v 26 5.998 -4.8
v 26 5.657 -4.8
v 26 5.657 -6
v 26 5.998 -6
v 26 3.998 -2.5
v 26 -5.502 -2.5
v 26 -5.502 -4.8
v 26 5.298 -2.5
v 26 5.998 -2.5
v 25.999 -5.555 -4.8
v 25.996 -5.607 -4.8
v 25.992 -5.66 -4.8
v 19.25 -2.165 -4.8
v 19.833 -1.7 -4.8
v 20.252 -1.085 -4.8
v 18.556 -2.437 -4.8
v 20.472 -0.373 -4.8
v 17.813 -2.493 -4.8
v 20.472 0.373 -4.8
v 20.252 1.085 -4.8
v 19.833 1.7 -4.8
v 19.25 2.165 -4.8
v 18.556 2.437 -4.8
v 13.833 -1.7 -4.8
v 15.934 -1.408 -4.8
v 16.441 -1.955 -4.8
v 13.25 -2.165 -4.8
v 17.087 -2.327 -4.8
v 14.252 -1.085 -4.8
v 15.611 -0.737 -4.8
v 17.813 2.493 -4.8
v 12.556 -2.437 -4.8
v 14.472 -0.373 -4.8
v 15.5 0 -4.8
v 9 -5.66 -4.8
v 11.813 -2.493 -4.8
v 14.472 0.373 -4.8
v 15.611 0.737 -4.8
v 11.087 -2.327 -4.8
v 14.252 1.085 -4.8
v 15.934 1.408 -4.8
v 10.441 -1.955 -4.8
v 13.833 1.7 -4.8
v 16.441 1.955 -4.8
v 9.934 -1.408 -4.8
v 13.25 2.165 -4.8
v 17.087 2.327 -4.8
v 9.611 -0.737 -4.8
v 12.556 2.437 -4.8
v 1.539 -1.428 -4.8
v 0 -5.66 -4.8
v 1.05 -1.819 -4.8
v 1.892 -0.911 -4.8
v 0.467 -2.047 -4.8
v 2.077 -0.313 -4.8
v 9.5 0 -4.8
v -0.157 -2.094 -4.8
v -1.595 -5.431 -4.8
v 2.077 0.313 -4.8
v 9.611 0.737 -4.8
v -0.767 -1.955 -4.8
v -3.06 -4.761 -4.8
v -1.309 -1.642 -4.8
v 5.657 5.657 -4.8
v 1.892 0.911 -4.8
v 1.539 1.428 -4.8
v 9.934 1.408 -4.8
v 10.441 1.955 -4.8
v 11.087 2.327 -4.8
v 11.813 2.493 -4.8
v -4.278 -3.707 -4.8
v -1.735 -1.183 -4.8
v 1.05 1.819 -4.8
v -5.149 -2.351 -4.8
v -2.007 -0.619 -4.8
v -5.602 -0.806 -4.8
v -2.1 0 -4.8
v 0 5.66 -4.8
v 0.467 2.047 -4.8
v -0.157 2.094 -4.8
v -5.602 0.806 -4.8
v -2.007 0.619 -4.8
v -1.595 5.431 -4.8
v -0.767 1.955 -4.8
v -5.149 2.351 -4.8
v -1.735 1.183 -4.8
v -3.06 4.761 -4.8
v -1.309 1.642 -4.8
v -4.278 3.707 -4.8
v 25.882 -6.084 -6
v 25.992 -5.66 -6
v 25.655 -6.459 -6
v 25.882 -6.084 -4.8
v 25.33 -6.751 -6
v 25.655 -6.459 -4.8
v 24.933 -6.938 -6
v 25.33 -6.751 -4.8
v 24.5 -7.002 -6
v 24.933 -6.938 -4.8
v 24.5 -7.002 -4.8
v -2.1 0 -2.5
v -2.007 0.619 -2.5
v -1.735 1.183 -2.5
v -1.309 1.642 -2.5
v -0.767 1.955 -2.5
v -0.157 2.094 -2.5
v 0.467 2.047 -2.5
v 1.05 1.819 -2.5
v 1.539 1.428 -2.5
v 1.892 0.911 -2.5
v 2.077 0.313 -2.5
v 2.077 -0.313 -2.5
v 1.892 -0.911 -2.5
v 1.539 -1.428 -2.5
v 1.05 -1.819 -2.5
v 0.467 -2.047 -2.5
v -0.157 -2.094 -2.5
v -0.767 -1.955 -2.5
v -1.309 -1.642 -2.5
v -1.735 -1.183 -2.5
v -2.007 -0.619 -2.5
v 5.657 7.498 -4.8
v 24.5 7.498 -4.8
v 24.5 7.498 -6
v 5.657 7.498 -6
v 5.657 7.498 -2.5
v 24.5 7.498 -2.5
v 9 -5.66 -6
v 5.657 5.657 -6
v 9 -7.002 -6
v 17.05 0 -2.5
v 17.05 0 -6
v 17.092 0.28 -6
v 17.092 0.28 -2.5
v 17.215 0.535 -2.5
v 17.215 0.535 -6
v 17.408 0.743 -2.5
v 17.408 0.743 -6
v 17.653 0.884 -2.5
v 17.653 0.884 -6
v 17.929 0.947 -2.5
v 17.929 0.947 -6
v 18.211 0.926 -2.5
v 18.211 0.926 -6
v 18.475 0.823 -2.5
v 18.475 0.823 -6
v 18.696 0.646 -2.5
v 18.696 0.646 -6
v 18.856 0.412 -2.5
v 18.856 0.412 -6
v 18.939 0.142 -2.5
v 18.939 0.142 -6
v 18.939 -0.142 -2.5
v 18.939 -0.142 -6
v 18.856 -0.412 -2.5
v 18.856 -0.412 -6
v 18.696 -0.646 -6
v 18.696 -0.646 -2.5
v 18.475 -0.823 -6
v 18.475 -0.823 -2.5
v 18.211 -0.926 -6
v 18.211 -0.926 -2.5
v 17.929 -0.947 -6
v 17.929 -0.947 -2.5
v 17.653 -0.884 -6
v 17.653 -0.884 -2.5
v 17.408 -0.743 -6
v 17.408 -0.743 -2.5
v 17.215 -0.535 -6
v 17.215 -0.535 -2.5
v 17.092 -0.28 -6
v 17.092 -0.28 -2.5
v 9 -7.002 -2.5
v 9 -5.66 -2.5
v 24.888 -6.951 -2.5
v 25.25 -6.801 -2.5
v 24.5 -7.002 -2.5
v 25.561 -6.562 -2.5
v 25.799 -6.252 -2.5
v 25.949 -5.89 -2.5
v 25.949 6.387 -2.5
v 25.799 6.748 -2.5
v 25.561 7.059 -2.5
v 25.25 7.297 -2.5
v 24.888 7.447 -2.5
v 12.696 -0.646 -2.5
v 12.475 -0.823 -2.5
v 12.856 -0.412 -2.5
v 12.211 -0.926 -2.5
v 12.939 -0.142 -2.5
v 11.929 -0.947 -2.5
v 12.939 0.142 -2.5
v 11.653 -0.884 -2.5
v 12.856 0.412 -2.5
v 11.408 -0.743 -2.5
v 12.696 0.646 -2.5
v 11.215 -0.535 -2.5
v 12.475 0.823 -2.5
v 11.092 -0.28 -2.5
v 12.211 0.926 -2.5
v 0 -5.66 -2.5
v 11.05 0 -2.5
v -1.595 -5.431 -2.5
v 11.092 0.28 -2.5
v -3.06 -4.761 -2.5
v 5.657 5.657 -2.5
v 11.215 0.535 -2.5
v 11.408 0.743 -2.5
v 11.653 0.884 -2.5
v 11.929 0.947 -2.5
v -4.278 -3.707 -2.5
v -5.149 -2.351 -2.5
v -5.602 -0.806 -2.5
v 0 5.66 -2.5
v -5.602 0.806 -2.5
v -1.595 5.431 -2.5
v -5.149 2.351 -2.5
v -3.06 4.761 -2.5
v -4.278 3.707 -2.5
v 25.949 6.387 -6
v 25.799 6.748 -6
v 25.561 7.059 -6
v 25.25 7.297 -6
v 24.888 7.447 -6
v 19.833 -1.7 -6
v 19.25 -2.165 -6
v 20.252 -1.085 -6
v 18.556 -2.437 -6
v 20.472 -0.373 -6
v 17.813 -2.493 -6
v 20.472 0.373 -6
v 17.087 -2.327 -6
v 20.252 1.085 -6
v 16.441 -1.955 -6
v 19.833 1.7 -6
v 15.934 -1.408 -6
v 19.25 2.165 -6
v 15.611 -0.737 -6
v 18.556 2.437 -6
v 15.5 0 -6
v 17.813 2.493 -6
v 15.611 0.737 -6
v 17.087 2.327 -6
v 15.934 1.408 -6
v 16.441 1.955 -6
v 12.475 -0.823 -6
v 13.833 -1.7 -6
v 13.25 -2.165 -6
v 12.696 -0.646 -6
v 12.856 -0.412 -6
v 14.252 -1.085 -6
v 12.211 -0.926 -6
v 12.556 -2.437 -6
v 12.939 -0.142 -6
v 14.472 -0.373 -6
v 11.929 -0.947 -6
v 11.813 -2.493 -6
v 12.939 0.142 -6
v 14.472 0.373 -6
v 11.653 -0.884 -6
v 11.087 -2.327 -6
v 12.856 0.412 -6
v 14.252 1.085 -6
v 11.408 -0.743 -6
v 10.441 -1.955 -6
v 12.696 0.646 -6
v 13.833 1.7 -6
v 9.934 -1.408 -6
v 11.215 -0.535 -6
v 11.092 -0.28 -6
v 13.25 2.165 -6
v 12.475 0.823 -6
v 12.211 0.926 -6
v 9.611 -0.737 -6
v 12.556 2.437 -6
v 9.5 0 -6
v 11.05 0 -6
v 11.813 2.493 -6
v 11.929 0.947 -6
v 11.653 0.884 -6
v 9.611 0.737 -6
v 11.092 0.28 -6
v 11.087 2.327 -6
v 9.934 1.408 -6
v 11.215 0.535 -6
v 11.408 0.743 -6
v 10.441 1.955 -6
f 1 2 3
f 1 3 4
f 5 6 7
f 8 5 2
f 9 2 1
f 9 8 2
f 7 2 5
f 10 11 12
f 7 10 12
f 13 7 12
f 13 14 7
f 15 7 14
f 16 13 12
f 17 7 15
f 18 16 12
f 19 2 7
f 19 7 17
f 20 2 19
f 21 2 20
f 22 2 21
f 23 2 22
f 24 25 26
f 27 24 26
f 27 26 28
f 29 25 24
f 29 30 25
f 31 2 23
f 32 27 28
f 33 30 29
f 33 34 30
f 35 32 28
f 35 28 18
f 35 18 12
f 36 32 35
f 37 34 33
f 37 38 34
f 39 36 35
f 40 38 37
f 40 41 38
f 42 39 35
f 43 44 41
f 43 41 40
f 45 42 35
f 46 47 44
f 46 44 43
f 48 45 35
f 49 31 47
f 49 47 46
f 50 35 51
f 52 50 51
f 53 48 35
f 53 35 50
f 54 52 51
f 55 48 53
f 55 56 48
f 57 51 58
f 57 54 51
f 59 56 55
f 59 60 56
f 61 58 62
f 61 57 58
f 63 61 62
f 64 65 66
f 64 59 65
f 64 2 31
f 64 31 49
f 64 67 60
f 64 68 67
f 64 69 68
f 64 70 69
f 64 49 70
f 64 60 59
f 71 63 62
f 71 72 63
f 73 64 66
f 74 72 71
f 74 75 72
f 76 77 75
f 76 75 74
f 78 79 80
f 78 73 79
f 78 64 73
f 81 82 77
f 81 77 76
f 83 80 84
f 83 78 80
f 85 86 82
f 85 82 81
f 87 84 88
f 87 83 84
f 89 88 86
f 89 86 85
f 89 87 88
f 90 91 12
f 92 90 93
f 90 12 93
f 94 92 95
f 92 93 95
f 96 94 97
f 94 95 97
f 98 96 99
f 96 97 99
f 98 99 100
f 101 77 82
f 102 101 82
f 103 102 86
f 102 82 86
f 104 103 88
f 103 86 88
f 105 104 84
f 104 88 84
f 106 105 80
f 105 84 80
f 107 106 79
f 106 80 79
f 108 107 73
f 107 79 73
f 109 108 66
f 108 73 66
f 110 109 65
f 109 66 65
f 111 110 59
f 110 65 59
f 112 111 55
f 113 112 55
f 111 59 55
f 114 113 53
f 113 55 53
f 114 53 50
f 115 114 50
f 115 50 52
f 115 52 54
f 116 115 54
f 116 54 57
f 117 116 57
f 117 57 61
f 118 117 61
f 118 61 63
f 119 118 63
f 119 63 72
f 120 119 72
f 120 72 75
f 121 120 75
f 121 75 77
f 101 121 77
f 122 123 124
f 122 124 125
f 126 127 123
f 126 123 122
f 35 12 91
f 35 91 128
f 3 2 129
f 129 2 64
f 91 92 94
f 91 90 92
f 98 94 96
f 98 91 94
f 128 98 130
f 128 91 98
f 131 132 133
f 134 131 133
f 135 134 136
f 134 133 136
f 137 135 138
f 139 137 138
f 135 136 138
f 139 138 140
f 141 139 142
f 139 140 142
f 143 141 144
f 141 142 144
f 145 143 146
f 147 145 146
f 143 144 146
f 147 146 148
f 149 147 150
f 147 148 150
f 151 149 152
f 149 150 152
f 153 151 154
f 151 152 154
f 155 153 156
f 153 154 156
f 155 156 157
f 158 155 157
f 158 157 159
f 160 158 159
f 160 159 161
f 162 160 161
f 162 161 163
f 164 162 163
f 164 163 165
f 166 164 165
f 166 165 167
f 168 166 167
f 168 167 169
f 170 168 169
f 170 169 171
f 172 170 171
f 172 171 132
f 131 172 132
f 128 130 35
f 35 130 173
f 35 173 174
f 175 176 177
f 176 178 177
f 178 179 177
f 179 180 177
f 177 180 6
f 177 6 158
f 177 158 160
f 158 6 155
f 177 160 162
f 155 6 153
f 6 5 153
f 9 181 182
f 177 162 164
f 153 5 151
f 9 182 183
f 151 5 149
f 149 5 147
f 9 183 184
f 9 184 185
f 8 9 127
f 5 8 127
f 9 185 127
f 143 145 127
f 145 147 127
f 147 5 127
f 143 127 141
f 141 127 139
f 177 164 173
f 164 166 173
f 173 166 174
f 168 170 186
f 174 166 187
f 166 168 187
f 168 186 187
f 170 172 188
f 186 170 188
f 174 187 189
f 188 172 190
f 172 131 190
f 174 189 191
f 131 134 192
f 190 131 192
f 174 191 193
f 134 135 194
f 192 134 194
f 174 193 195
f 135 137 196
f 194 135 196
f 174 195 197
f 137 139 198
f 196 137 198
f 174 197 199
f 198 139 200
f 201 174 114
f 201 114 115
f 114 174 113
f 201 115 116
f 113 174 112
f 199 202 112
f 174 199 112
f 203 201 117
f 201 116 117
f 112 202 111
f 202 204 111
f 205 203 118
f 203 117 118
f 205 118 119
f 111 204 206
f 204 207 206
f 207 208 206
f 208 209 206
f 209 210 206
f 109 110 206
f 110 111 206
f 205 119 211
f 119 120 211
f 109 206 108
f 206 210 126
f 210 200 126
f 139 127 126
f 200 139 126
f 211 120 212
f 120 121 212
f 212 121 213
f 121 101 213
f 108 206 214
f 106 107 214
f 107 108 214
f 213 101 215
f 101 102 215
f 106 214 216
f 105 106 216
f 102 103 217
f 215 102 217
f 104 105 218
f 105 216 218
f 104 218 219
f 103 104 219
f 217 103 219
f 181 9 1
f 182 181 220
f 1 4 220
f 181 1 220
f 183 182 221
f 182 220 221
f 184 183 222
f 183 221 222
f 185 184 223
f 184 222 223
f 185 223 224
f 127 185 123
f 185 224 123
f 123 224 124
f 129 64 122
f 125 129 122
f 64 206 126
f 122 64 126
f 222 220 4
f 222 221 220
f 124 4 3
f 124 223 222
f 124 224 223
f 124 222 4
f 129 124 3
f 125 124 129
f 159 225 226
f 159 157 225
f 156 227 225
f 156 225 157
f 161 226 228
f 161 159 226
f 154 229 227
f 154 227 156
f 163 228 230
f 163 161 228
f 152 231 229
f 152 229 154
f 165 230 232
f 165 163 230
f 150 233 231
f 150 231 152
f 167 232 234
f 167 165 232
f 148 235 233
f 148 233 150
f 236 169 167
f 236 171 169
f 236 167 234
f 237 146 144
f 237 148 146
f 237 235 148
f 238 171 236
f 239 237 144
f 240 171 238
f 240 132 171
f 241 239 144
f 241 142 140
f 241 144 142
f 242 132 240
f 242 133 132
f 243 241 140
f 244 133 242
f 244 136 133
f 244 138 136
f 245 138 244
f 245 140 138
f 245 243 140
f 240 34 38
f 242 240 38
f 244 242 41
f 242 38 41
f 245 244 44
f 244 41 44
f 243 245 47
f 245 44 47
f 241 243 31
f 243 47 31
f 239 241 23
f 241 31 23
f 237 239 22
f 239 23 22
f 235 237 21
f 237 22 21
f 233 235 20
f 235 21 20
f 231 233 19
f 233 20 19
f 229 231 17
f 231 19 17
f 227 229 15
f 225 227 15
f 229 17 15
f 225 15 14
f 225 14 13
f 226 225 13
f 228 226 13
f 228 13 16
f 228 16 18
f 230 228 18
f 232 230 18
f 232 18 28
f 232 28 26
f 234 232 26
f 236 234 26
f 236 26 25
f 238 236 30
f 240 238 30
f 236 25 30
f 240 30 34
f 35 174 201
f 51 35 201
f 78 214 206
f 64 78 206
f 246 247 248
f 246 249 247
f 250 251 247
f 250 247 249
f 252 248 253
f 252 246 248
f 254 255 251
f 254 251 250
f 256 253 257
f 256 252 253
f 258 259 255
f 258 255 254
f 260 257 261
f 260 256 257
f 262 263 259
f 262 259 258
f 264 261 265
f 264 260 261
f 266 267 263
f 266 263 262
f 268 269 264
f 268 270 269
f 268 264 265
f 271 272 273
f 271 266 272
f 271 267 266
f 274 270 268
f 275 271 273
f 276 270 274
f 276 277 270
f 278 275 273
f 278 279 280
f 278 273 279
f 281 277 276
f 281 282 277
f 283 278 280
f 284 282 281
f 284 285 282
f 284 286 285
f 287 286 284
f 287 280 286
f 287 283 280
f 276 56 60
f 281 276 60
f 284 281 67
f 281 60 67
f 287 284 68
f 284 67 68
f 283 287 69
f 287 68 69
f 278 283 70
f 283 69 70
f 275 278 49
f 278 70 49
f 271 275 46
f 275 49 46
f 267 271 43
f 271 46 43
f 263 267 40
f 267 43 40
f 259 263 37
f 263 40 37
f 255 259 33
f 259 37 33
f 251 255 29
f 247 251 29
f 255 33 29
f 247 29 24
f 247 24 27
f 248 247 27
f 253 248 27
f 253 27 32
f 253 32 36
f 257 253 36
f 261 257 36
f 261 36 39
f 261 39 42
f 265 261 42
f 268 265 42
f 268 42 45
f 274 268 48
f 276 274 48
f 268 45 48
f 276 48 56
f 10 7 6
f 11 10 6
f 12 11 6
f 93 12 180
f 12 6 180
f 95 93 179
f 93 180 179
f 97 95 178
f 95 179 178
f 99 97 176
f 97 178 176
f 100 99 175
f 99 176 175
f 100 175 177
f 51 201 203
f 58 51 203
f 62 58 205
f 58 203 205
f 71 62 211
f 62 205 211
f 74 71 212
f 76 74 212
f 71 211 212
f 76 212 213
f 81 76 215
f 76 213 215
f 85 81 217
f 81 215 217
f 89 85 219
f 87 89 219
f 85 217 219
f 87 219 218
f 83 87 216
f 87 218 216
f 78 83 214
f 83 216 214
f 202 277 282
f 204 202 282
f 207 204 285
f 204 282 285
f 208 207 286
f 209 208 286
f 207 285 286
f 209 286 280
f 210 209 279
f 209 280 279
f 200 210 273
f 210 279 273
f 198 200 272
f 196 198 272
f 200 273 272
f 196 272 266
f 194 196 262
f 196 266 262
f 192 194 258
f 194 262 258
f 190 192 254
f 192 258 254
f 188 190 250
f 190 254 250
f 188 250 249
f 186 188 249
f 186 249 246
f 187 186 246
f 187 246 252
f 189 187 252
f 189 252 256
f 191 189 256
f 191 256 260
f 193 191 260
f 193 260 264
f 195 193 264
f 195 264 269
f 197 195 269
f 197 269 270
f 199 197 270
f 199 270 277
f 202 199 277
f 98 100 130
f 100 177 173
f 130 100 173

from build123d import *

# Parameters (mm, degrees)
BOSS_EXTRUDE1_DEPTH = 2
BOSS_EXTRUDE2_START = 2.5
BOSS_EXTRUDE2_DEPTH = 2.5
CUT_EXTRUDE1_DEPTH  = 2.5
BOSS_EXTRUDE3_DEPTH = 2.3
SKETCH9_R           = 2.1
CUT_EXTRUDE2_DEPTH  = 2.5
SKETCH10_R          = 2.5
BOSS_EXTRUDE4_DEPTH = 1.2
SKETCH11_R          = 0.95
CUT_EXTRUDE3_DEPTH  = 9.2
SKETCH12_R          = 2
CUT_EXTRUDE4_DEPTH  = 2.5
SKETCH14_W          = 20.343145751
SKETCH14_H          = 1.841510486
SKETCH14_W_2        = 17
SKETCH14_H_2        = 1.34163614
BOSS_EXTRUDE5_DEPTH = 1.2
FILLET1_R           = 1.5
SKETCH17_R          = 0.95
CUT_EXTRUDE5_DEPTH  = 3


# Read off the part's stored shape, not the designer's step: Boss-Extrude3
with BuildPart() as part:
    # Sketch5 → Boss-Extrude1 (new body)
    with BuildSketch(Plane.XY):
        with BuildLine():
            Line((8, 0), (9, -2.501635265))
            Line((9, -2.501635265), (9, -7.001635265))
            Line((9, -7.001635265), (26, -7.001635265))
            Line((26, -7.001635265), (26, 7.498364735))
            Line((26, 7.498364735), (5.656854249, 7.498364735))
            Line((5.656854249, 7.498364735), (5.656854249, 5.656854249))
            ThreePointArc((5.656854249, 5.656854249), (7.39103626, 3.061467459), (8, 0))
        make_face()
    extrude(amount=BOSS_EXTRUDE1_DEPTH)

    # Sketch6 → Boss-Extrude2 (add)
    with BuildSketch(Plane(origin=(0, 0, 0), x_dir=(-1, 0, 0), z_dir=(0, 0, -1)).offset(BOSS_EXTRUDE2_START)):
        with BuildLine():
            Line((-5.656854249, 7.498364735), (-5.656854249, 5.656854249))
            ThreePointArc((-5.656854249, 5.656854249), (-7.39103626, 3.061467459), (-8, 0))
            Line((-8, 0), (-9, -2.501635265))
            Line((-9, -2.501635265), (-9, -7.001635265))
            Line((-9, -7.001635265), (-26, -7.001635265))
            Line((-26, -7.001635265), (-26, 7.498364735))
            Line((-26, 7.498364735), (-5.656854249, 7.498364735))
        make_face()
    extrude(amount=-BOSS_EXTRUDE2_DEPTH)

    # Sketch7 → Cut-Extrude1 (cut)
    with BuildSketch(Plane(origin=(0, 0, -2.5), x_dir=(-1, 0, 0), z_dir=(0, 0, -1))):
        Polygon((-26, 5.298364735), (-2.738141148, 5.298364735), (-2.738141148, 3.998364735), (-29.849535112, 3.998364735), (-29.849535112, 5.298364735), align=None)
    extrude(amount=-CUT_EXTRUDE1_DEPTH, mode=Mode.SUBTRACT)

    # Boss-Extrude3 outline → Boss-Extrude3 (add)
    with BuildSketch(Plane(origin=(0, 0, -2.5), x_dir=(-1, 0, 0), z_dir=(0, 0, -1))):
        with BuildLine():
            Line((-9, -7.001635265), (-9, -5.659999125))
            Line((-9, -5.659999125), (0, -5.659998688))
            ThreePointArc((0, -5.659998688), (5.659998688, 0), (0, 5.659998688))
            Line((0, 5.659998688), (-5.656854249, 5.656854249))
            Line((-5.656854249, 5.656854249), (-5.656854249, 7.498364735))
            Line((-5.656854249, 7.498364735), (-26, 7.498364735))
            Line((-26, 7.498364735), (-26, -7.001635265))
            Line((-26, -7.001635265), (-9, -7.001635265))
        make_face()
    extrude(amount=BOSS_EXTRUDE3_DEPTH)

    # Sketch9 → Cut-Extrude2 (cut)
    with BuildSketch(Plane(origin=(0, 0, -4.8), x_dir=(-1, 0, 0), z_dir=(0, 0, -1))):
        Circle(SKETCH9_R)
    extrude(amount=-CUT_EXTRUDE2_DEPTH, mode=Mode.SUBTRACT)

    # Sketch10 → Boss-Extrude4 (add)
    with BuildSketch(Plane(origin=(0, 0, -4.8), x_dir=(-1, 0, 0), z_dir=(0, 0, -1))):
        with Locations((-12, 0)):
            Circle(SKETCH10_R)
        with Locations((-18, 0)):
            Circle(SKETCH10_R)
    extrude(amount=BOSS_EXTRUDE4_DEPTH)

    # Sketch11 → Cut-Extrude3 (cut)
    with BuildSketch(Plane(origin=(0, 0, -6), x_dir=(-1, 0, 0), z_dir=(0, 0, -1))):
        with Locations((-18, 0)):
            Circle(SKETCH11_R)
        with Locations((-12, 0)):
            Circle(SKETCH11_R)
    extrude(amount=-CUT_EXTRUDE3_DEPTH, mode=Mode.SUBTRACT)

    # Sketch12 → Cut-Extrude4 (cut)
    with BuildSketch(Plane.XY.offset(2)):
        with Locations((12, 0)):
            Circle(SKETCH12_R)
        with Locations((18, 0)):
            Circle(SKETCH12_R)
    extrude(amount=-CUT_EXTRUDE4_DEPTH, mode=Mode.SUBTRACT)

    # Sketch14 → Boss-Extrude5 (add)
    with BuildSketch(Plane(origin=(0, 0, -4.8), x_dir=(-1, 0, 0), z_dir=(0, 0, -1))):
        with Locations((-15.828427124, 6.577609492)):
            Rectangle(SKETCH14_W, SKETCH14_H)
        with Locations((-17.5, -6.330817195)):
            Rectangle(SKETCH14_W_2, SKETCH14_H_2)
    extrude(amount=BOSS_EXTRUDE5_DEPTH)

    # Fillet1
    # the kernel refuses this fillet: 1.5 mm, written as the material it takes off along each edge
    with BuildSketch(Plane(origin=(24.5, -5.501635265, 0.5), x_dir=(0, 0, 1), z_dir=(0, -1, 0))) as fillet1_piece_1_section:
        Polygon((0, 0), (FILLET1_R, 0), (FILLET1_R, -FILLET1_R), (0, -FILLET1_R), align=None)
    fillet1_piece_1 = extrude(amount=FILLET1_R, mode=Mode.PRIVATE)
    fillet1_piece_1 = fillet1_piece_1 - Plane(origin=(24.5, -5.501635265, 0.5), x_dir=(-0.7071067811865475, 0, -0.7071067811865475), z_dir=(0, -1, 0)) * Sphere(FILLET1_R, mode=Mode.PRIVATE)
    add(fillet1_piece_1, mode=Mode.SUBTRACT)
    with BuildSketch(Plane(origin=(24.5, 5.998364735, 0.5), x_dir=(0, 0, 1), z_dir=(0, 1, 0))) as fillet1_piece_2_section:
        Polygon((0, 0), (FILLET1_R, 0), (FILLET1_R, FILLET1_R), (0, FILLET1_R), align=None)
    fillet1_piece_2 = extrude(amount=FILLET1_R, mode=Mode.PRIVATE)
    fillet1_piece_2 = fillet1_piece_2 - Plane(origin=(24.5, 5.998364735, 0.5), x_dir=(-0.7071067811865475, 0, -0.7071067811865475), z_dir=(0, 1, 0)) * Sphere(FILLET1_R, mode=Mode.PRIVATE)
    add(fillet1_piece_2, mode=Mode.SUBTRACT)
    with BuildSketch(Plane(origin=(26, -5.501635265, 2), x_dir=(-1, 0, 0), z_dir=(0, 1, 0))) as fillet1_piece_3:
        with BuildLine():
            CenterArc((FILLET1_R, -FILLET1_R), FILLET1_R, 90, 90)
            Line((0, -FILLET1_R), (0, 0))
            Line((0, 0), (FILLET1_R, 0))
        make_face()
    extrude(amount=11.5, mode=Mode.SUBTRACT)
    with BuildSketch(Plane(origin=(26, -7.001635265, -2.5), x_dir=(-1, 0, 0), z_dir=(0, 0, 1))) as fillet1_piece_4:
        with BuildLine():
            CenterArc((FILLET1_R, -FILLET1_R), FILLET1_R, 90, 90)
            Line((0, -FILLET1_R), (0, 0))
            Line((0, 0), (FILLET1_R, 0))
        make_face()
    extrude(amount=3, mode=Mode.SUBTRACT)
    with BuildSketch(Plane(origin=(5.25, -7.001635265, 2), x_dir=(0, 1, 0), z_dir=(1, 0, 0))) as fillet1_piece_5:
        with BuildLine():
            CenterArc((FILLET1_R, -FILLET1_R), FILLET1_R, 90, 90)
            Line((0, -FILLET1_R), (0, 0))
            Line((0, 0), (FILLET1_R, 0))
        make_face()
    extrude(amount=19.25, mode=Mode.SUBTRACT)
    with BuildSketch(Plane(origin=(24.5, 7.498364735, 2), x_dir=(0, -1, 0), z_dir=(-1, 0, 0))) as fillet1_piece_6:
        with BuildLine():
            CenterArc((FILLET1_R, -FILLET1_R), FILLET1_R, 90, 90)
            Line((0, -FILLET1_R), (0, 0))
            Line((0, 0), (FILLET1_R, 0))
        make_face()
    extrude(amount=22.593145751, mode=Mode.SUBTRACT)
    with BuildSketch(Plane(origin=(26, 7.498364735, -2.5), x_dir=(-1, 0, 0), z_dir=(0, 0, 1))) as fillet1_piece_7:
        with BuildLine():
            CenterArc((FILLET1_R, FILLET1_R), FILLET1_R, 180, 90)
            Line((0, FILLET1_R), (0, 0))
            Line((0, 0), (FILLET1_R, 0))
        make_face()
    extrude(amount=3, mode=Mode.SUBTRACT)
    with BuildSketch(Plane(origin=(26, 7.498364735, -2.5), x_dir=(-1.0, -1.9174232572065026e-10, 0), z_dir=(0, 0, -1))) as fillet1_piece_8:
        with BuildLine():
            CenterArc((FILLET1_R, -FILLET1_R), FILLET1_R, 90.000000011, 90)
            Line((FILLET1_R * 1.9173522033e-10, -FILLET1_R), (0, 0))
            Line((0, 0), (FILLET1_R, 0))
        make_face()
    extrude(amount=2.3, mode=Mode.SUBTRACT)
    with BuildSketch(Plane(origin=(26, 7.498364735, -4.8), x_dir=(-1, 0, 0), z_dir=(0, 0, -1))) as fillet1_piece_9:
        with BuildLine():
            CenterArc((FILLET1_R, -FILLET1_R), FILLET1_R, 90, 90)
            Line((0, -FILLET1_R), (0, 0))
            Line((0, 0), (FILLET1_R, 0))
        make_face()
    extrude(amount=4.95, mode=Mode.SUBTRACT)
    with BuildSketch(Plane(origin=(26, -7.001635265, -2.5), x_dir=(-1.0, -1.9169850891861218e-10, 0), z_dir=(0, 0, -1))) as fillet1_piece_10:
        with BuildLine():
            CenterArc((FILLET1_R, FILLET1_R), FILLET1_R, 180.000000011, 90)
            Line((-FILLET1_R * 1.91707982785e-10, FILLET1_R), (0, 0))
            Line((0, 0), (FILLET1_R, 0))
        make_face()
    extrude(amount=2.3, mode=Mode.SUBTRACT)
    with BuildSketch(Plane(origin=(26, -7.001635265, -4.8), x_dir=(-1, 0, 0), z_dir=(0, 0, -1))) as fillet1_piece_11:
        with BuildLine():
            CenterArc((FILLET1_R, FILLET1_R), FILLET1_R, 180, 90)
            Line((0, FILLET1_R), (0, 0))
            Line((0, 0), (FILLET1_R, 0))
        make_face()
    extrude(amount=4.95, mode=Mode.SUBTRACT)

    # Sketch17 → Cut-Extrude5 (cut)
    with BuildSketch(Plane.XZ.offset(7.001635265)):
        with Locations((22, -1)):
            Circle(SKETCH17_R)
        with Locations((18, -1)):
            Circle(SKETCH17_R)
    extrude(amount=-CUT_EXTRUDE5_DEPTH, mode=Mode.SUBTRACT)


with BuildPart() as body_2:
    # Split1: the piece on the far side of the plane
    add(part.part)
    split(bisect_by=Plane(origin=(0, 0, -2.5), x_dir=(-1, 0, 0), z_dir=(0, 0, -1)), keep=Keep.BOTTOM)


with BuildPart() as part_1:
    add(part.part)

    # Split1
    split(bisect_by=Plane(origin=(0, 0, -2.5), x_dir=(-1, 0, 0), z_dir=(0, 0, -1)), keep=Keep.TOP)


solid = part_1.part
